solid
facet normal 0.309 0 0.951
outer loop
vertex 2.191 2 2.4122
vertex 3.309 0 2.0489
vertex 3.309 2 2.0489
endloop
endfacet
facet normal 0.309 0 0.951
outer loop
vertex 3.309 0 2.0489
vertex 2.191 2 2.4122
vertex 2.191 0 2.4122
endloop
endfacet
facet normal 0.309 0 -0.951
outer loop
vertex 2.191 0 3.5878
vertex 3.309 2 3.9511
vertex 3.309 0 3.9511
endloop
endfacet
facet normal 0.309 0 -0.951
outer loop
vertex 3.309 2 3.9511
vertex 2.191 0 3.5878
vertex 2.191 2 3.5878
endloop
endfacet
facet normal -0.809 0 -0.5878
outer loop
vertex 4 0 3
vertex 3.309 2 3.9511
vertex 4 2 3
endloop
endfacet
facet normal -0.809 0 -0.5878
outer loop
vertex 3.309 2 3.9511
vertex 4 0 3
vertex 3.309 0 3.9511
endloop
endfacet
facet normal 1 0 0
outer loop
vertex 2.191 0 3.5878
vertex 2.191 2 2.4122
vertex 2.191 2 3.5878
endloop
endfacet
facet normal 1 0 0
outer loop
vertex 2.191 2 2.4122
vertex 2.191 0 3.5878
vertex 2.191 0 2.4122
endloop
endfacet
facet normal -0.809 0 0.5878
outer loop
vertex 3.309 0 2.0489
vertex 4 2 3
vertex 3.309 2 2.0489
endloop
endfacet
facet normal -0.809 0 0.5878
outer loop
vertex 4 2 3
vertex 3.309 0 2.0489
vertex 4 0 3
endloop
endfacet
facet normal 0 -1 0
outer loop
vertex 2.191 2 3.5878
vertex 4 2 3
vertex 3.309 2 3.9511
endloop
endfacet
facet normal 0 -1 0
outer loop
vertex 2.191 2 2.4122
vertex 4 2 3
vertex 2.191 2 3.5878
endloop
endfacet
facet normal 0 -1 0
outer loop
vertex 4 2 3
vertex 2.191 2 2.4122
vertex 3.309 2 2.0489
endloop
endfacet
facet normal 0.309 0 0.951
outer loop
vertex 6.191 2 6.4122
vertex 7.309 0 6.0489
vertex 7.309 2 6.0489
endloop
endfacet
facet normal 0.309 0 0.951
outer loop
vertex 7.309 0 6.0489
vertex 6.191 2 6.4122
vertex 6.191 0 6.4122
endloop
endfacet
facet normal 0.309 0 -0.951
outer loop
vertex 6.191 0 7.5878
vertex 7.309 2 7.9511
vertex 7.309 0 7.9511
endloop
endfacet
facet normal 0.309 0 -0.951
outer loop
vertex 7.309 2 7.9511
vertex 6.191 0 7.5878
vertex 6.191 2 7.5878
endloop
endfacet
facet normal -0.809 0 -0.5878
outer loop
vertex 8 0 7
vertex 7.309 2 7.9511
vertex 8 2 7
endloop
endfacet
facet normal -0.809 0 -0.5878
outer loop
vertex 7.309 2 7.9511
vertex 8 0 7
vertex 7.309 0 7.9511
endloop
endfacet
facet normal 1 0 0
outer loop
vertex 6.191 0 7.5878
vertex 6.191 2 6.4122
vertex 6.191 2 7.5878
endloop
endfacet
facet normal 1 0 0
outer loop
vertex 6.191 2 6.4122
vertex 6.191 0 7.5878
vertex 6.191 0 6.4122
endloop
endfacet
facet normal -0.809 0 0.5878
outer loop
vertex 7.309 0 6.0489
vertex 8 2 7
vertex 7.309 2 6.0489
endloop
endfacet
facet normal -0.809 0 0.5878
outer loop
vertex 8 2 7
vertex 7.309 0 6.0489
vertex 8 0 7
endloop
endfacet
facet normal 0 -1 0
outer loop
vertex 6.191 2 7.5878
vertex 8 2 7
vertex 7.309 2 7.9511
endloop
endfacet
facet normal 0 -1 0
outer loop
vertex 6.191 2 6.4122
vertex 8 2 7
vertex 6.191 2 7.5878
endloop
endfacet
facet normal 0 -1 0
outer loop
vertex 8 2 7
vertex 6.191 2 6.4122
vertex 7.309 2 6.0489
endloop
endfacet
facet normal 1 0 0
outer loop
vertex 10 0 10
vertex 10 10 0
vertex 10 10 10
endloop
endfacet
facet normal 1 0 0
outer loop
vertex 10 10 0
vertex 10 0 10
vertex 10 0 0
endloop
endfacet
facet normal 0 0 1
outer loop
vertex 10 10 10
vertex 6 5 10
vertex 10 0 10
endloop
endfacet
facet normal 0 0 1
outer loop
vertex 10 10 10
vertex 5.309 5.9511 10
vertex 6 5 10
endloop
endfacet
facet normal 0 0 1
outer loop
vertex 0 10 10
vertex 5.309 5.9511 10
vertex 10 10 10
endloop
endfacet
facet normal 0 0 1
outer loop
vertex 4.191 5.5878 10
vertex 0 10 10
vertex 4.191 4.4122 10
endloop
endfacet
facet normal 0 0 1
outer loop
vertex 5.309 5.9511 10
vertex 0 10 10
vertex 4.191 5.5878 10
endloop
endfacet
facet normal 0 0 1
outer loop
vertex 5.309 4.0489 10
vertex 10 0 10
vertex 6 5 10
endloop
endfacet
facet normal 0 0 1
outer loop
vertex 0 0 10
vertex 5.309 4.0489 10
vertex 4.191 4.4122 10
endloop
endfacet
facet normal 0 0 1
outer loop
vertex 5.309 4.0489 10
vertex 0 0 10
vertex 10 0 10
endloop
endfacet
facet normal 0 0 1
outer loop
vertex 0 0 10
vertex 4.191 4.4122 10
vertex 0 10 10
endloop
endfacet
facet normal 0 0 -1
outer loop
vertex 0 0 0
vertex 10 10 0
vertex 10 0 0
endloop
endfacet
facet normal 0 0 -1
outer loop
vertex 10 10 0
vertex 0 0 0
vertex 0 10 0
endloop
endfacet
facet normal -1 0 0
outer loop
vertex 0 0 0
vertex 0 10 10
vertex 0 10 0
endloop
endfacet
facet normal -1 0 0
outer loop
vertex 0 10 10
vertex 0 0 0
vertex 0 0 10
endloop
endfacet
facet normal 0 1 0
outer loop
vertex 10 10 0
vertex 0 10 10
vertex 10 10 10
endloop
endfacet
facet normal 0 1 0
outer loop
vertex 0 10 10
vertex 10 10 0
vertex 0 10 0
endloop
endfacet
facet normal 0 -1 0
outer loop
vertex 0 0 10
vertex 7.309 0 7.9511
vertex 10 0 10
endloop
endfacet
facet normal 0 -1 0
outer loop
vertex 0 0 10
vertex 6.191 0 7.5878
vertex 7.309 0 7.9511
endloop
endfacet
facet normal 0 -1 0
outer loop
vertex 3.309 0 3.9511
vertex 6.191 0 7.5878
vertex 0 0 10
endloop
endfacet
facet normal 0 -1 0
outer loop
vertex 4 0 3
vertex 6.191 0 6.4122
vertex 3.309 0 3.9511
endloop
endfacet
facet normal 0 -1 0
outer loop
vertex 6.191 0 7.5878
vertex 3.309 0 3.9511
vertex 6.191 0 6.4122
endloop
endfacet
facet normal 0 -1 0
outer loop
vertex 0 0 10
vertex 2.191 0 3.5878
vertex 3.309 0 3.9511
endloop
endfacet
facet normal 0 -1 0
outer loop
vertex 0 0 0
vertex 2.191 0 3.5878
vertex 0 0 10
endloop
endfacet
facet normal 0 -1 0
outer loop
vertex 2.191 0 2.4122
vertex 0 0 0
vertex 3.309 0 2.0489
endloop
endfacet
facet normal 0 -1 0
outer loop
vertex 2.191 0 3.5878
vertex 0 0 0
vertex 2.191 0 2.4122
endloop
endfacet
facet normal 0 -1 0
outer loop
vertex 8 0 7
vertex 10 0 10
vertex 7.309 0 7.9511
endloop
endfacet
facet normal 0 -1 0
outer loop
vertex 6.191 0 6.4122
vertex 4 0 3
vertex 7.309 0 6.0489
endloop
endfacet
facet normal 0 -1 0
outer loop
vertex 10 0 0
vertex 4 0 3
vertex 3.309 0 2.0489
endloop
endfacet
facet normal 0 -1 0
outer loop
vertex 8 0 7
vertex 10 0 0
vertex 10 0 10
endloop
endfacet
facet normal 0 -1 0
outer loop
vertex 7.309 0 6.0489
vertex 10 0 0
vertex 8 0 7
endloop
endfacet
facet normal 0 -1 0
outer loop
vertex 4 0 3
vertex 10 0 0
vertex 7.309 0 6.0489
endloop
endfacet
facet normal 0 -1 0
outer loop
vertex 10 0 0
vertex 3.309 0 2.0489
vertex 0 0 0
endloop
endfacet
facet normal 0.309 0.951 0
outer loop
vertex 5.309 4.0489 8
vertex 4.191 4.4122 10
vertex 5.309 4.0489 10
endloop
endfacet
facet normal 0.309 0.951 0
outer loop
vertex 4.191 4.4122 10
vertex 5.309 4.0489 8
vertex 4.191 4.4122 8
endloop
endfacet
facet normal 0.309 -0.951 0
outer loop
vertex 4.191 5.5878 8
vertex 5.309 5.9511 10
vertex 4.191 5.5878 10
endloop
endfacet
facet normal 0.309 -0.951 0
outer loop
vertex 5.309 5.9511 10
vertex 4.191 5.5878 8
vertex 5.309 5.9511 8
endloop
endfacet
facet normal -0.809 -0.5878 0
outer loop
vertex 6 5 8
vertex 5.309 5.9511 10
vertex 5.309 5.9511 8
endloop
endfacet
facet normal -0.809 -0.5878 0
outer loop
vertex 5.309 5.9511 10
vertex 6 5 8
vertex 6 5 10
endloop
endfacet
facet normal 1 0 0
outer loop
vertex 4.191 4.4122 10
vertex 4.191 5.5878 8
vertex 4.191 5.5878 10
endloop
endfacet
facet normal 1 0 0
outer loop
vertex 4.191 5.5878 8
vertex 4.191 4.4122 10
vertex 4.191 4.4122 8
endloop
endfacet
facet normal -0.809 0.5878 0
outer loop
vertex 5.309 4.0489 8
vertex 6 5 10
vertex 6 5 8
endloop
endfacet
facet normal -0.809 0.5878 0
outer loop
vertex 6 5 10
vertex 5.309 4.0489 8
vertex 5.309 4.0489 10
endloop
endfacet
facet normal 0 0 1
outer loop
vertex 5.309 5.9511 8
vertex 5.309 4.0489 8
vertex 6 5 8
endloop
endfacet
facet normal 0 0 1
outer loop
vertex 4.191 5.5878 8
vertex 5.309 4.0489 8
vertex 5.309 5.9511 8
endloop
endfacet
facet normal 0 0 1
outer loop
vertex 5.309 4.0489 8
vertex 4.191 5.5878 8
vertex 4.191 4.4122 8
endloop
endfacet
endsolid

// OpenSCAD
// file: local.scad
/*
Copyright (c) 2013 Johannes Reinhardt <jreinhardt@ist-dein-freund.de>

Permission is hereby granted, free of charge, to any person obtaining a copy
of this software and associated documentation files (the "Software"), to deal
in the Software without restriction, including without limitation the rights
to use, copy, modify, merge, publish, distribute, sublicense, and/or sell
copies of the Software, and to permit persons to whom the Software is
furnished to do so, subject to the following conditions:

The above copyright notice and this permission notice shall be included in
all copies or substantial portions of the Software.

THE SOFTWARE IS PROVIDED "AS IS", WITHOUT WARRANTY OF ANY KIND, EXPRESS OR
IMPLIED, INCLUDING BUT NOT LIMITED TO THE WARRANTIES OF MERCHANTABILITY,
FITNESS FOR A PARTICULAR PURPOSE AND NONINFRINGEMENT. IN NO EVENT SHALL THE
AUTHORS OR COPYRIGHT HOLDERS BE LIABLE FOR ANY CLAIM, DAMAGES OR OTHER
LIABILITY, WHETHER IN AN ACTION OF CONTRACT, TORT OR OTHERWISE, ARISING FROM,
OUT OF OR IN CONNECTION WITH THE SOFTWARE OR THE USE OR OTHER DEALINGS IN
THE SOFTWARE.
*/

/*
local.scad local coordinate systems for OpenSCAD

for more information, see https://github.com/jreinhardt/local-scad
*/

//a few utility functions
function norm(a) = sqrt(a*a);
function unit_vector(v) = v/norm(v);
function clamp(v,lower_bound,upper_bound) = min(max(v,lower_bound),upper_bound);
function cross_product(a,b) = [
	a[1]*b[2]-a[2]*b[1],
	a[2]*b[0]-a[0]*b[2],
	a[0]*b[1]-a[1]*b[0]
];

//works for both numbers and vectors
function almost_equal(number, ref, tol) = sqrt((number-ref)*(number-ref)) < tol;

function _rotation_angle(a,b) = (a*b > 0) ? 
	asin(clamp(norm(cross_product(b,a))/norm(a)/norm(b),-1,1)) :
	180 - asin(clamp(norm(cross_product(b,a))/norm(a)/norm(b),-1,1));

//The (non-unit) rotation axis and angle around which a has to be rotated to be colinear to b
function calculate_rotation_axis(a,b) =
	//if the two vectors are not colinear find a rotation axis using the cross product
	(norm(cross_product(b,a)) != 0) ? [unit_vector(cross_product(b,a)),_rotation_angle(a,b)] :
	//if they are colinear and do not lie in the yz plane, choose the rotation axis from the yz plane
	(a*[1,0,0] < 0) ? [unit_vector([0,-a[1],+a[0]]),acos(clamp(a*b/norm(a)/norm(b),-1,1))] :
	(a*[1,0,0] > 0) ? [unit_vector([0,+a[1],-a[0]]),acos(clamp(a*b/norm(a)/norm(b),-1,1))] :
	//otherwise use the x axis
	[[1,0,0],acos(clamp(a*b/norm(a)/norm(b),-1,1))];

function calculate_axes(x,y) = [unit_vector(x),unit_vector(y), unit_vector(cross_product(x,y))];

function new_cs(origin=[0,0,0],axes=[[1,0,0],[0,1,0],[0,0,1]]) = (len(axes) == 2) ?
	[origin,calculate_axes(axes[0],axes[1])] :
	is_orthonormal([origin,axes]) ?
		[origin,axes] :
		"Error: Axes are not orthonormal";

function is_orthonormal(cs,tol=1e-3) =
	(almost_equal(norm(cs[1][0]),1,tol)) &&
	(almost_equal(norm(cs[1][1]),1,tol)) &&
	(almost_equal(norm(cs[1][2]),1,tol)) &&
	(almost_equal(cross_product(cs[1][0],cs[1][1]),cs[1][2],tol)) &&
	(almost_equal(cross_product(cs[1][1],cs[1][2]),cs[1][0],tol)) &&
	(almost_equal(cross_product(cs[1][2],cs[1][0]),cs[1][1],tol));

function unit_matrix3() = [
[1,0,0],
[0,1,0],
[0,0,1]];

function tensor_product_matrix3(u,v) = [
[u[0]*v[0], u[0]*v[1], u[0]*v[2]],
[u[1]*v[0], u[1]*v[1], u[1]*v[2]],
[u[2]*v[0], u[2]*v[1], u[2]*v[2]]];

function cross_product_matrix3(v) = [
[   0 , -v[2], +v[1]],
[+v[2],    0 , -v[0]],
[-v[1],  v[0],    0 ]];

function rotation_matrix3(n,angle) =
	cos(angle)*unit_matrix3() +
	sin(angle)*cross_product_matrix3(n) +
	(1-cos(angle))*tensor_product_matrix3(n,n);

//the modules are used directly by the user
module show_cs(cs){
	origin = cs[0];
	axes = cs[1];
	x_rot = calculate_rotation_axis(axes[0],[0,0,1]);
	y_rot = calculate_rotation_axis(axes[1],[0,0,1]);
	z_rot = calculate_rotation_axis(axes[2],[0,0,1]);
	translate(origin){
		color("Gray") sphere(0.2);
		rotate(x_rot[1],x_rot[0]) color("Red") cylinder(r=0.1,h=norm(axes[0]));
		rotate(y_rot[1],y_rot[0]) color("Green") cylinder(r=0.1,h=norm(axes[1]));
		rotate(z_rot[1],z_rot[0]) color("Blue") cylinder(r=0.1,h=norm(axes[2]));
	}
}

module translate_local(cs,v=[0,0,0]){
	origin = cs[0];
	axes = cs[1];
	x_rot = calculate_rotation_axis(axes[0],[1,0,0]);
	y_rot = calculate_rotation_axis(axes[1],
		rotation_matrix3(x_rot[0],x_rot[1])*[0,1,0]);
	translate(origin+v*axes){
		//align y axes
		rotate(y_rot[1],y_rot[0]){
			//align x axes
			rotate(x_rot[1],x_rot[0]){
				children(0);
			}
		}
	}
}

module in_cs(cs){
	origin = cs[0];
	axes = cs[1];
	x_rot = calculate_rotation_axis(axes[0],[1,0,0]);
	y_rot = calculate_rotation_axis(axes[1],
		rotation_matrix3(x_rot[0],x_rot[1])*[0,1,0]);
	translate(origin){
		//align y axes
		rotate(y_rot[1],y_rot[0]){
			//align x axes
			rotate(x_rot[1],x_rot[0]){
				children(0);
			}
		}
	}
}

module align(cs, cs_dst, displacement=[0,0,0]){
	x_rot = calculate_rotation_axis(cs[1][0],cs_dst[1][0]);
	y_rot = _rotation_angle(cs[1][1],
		rotation_matrix3(x_rot[0],x_rot[1])*cs_dst[1][1]);
	translate(cs_dst[0]+displacement*cs_dst[1])
		//align x axes
		rotate(-x_rot[1],x_rot[0])
				//align y axes
				rotate(-y_rot,cs[1][0])
				translate(-cs[0])
					children(0);
}
// main file
use <local.scad>

c1 = new_cs(origin=[0,0,10]);
c2 = new_cs(axes=[[1,0,0],[0,0,1]]);

difference(){
	cube([10,10,10]);
	translate_local(c1,[5,5,-2]) cylinder(r=1,h=3);
	in_cs(c2) union(){
		translate([3,3,-2]) cylinder(r=1,h=3);
		translate([7,7,-2]) cylinder(r=1,h=3);
	}
}
